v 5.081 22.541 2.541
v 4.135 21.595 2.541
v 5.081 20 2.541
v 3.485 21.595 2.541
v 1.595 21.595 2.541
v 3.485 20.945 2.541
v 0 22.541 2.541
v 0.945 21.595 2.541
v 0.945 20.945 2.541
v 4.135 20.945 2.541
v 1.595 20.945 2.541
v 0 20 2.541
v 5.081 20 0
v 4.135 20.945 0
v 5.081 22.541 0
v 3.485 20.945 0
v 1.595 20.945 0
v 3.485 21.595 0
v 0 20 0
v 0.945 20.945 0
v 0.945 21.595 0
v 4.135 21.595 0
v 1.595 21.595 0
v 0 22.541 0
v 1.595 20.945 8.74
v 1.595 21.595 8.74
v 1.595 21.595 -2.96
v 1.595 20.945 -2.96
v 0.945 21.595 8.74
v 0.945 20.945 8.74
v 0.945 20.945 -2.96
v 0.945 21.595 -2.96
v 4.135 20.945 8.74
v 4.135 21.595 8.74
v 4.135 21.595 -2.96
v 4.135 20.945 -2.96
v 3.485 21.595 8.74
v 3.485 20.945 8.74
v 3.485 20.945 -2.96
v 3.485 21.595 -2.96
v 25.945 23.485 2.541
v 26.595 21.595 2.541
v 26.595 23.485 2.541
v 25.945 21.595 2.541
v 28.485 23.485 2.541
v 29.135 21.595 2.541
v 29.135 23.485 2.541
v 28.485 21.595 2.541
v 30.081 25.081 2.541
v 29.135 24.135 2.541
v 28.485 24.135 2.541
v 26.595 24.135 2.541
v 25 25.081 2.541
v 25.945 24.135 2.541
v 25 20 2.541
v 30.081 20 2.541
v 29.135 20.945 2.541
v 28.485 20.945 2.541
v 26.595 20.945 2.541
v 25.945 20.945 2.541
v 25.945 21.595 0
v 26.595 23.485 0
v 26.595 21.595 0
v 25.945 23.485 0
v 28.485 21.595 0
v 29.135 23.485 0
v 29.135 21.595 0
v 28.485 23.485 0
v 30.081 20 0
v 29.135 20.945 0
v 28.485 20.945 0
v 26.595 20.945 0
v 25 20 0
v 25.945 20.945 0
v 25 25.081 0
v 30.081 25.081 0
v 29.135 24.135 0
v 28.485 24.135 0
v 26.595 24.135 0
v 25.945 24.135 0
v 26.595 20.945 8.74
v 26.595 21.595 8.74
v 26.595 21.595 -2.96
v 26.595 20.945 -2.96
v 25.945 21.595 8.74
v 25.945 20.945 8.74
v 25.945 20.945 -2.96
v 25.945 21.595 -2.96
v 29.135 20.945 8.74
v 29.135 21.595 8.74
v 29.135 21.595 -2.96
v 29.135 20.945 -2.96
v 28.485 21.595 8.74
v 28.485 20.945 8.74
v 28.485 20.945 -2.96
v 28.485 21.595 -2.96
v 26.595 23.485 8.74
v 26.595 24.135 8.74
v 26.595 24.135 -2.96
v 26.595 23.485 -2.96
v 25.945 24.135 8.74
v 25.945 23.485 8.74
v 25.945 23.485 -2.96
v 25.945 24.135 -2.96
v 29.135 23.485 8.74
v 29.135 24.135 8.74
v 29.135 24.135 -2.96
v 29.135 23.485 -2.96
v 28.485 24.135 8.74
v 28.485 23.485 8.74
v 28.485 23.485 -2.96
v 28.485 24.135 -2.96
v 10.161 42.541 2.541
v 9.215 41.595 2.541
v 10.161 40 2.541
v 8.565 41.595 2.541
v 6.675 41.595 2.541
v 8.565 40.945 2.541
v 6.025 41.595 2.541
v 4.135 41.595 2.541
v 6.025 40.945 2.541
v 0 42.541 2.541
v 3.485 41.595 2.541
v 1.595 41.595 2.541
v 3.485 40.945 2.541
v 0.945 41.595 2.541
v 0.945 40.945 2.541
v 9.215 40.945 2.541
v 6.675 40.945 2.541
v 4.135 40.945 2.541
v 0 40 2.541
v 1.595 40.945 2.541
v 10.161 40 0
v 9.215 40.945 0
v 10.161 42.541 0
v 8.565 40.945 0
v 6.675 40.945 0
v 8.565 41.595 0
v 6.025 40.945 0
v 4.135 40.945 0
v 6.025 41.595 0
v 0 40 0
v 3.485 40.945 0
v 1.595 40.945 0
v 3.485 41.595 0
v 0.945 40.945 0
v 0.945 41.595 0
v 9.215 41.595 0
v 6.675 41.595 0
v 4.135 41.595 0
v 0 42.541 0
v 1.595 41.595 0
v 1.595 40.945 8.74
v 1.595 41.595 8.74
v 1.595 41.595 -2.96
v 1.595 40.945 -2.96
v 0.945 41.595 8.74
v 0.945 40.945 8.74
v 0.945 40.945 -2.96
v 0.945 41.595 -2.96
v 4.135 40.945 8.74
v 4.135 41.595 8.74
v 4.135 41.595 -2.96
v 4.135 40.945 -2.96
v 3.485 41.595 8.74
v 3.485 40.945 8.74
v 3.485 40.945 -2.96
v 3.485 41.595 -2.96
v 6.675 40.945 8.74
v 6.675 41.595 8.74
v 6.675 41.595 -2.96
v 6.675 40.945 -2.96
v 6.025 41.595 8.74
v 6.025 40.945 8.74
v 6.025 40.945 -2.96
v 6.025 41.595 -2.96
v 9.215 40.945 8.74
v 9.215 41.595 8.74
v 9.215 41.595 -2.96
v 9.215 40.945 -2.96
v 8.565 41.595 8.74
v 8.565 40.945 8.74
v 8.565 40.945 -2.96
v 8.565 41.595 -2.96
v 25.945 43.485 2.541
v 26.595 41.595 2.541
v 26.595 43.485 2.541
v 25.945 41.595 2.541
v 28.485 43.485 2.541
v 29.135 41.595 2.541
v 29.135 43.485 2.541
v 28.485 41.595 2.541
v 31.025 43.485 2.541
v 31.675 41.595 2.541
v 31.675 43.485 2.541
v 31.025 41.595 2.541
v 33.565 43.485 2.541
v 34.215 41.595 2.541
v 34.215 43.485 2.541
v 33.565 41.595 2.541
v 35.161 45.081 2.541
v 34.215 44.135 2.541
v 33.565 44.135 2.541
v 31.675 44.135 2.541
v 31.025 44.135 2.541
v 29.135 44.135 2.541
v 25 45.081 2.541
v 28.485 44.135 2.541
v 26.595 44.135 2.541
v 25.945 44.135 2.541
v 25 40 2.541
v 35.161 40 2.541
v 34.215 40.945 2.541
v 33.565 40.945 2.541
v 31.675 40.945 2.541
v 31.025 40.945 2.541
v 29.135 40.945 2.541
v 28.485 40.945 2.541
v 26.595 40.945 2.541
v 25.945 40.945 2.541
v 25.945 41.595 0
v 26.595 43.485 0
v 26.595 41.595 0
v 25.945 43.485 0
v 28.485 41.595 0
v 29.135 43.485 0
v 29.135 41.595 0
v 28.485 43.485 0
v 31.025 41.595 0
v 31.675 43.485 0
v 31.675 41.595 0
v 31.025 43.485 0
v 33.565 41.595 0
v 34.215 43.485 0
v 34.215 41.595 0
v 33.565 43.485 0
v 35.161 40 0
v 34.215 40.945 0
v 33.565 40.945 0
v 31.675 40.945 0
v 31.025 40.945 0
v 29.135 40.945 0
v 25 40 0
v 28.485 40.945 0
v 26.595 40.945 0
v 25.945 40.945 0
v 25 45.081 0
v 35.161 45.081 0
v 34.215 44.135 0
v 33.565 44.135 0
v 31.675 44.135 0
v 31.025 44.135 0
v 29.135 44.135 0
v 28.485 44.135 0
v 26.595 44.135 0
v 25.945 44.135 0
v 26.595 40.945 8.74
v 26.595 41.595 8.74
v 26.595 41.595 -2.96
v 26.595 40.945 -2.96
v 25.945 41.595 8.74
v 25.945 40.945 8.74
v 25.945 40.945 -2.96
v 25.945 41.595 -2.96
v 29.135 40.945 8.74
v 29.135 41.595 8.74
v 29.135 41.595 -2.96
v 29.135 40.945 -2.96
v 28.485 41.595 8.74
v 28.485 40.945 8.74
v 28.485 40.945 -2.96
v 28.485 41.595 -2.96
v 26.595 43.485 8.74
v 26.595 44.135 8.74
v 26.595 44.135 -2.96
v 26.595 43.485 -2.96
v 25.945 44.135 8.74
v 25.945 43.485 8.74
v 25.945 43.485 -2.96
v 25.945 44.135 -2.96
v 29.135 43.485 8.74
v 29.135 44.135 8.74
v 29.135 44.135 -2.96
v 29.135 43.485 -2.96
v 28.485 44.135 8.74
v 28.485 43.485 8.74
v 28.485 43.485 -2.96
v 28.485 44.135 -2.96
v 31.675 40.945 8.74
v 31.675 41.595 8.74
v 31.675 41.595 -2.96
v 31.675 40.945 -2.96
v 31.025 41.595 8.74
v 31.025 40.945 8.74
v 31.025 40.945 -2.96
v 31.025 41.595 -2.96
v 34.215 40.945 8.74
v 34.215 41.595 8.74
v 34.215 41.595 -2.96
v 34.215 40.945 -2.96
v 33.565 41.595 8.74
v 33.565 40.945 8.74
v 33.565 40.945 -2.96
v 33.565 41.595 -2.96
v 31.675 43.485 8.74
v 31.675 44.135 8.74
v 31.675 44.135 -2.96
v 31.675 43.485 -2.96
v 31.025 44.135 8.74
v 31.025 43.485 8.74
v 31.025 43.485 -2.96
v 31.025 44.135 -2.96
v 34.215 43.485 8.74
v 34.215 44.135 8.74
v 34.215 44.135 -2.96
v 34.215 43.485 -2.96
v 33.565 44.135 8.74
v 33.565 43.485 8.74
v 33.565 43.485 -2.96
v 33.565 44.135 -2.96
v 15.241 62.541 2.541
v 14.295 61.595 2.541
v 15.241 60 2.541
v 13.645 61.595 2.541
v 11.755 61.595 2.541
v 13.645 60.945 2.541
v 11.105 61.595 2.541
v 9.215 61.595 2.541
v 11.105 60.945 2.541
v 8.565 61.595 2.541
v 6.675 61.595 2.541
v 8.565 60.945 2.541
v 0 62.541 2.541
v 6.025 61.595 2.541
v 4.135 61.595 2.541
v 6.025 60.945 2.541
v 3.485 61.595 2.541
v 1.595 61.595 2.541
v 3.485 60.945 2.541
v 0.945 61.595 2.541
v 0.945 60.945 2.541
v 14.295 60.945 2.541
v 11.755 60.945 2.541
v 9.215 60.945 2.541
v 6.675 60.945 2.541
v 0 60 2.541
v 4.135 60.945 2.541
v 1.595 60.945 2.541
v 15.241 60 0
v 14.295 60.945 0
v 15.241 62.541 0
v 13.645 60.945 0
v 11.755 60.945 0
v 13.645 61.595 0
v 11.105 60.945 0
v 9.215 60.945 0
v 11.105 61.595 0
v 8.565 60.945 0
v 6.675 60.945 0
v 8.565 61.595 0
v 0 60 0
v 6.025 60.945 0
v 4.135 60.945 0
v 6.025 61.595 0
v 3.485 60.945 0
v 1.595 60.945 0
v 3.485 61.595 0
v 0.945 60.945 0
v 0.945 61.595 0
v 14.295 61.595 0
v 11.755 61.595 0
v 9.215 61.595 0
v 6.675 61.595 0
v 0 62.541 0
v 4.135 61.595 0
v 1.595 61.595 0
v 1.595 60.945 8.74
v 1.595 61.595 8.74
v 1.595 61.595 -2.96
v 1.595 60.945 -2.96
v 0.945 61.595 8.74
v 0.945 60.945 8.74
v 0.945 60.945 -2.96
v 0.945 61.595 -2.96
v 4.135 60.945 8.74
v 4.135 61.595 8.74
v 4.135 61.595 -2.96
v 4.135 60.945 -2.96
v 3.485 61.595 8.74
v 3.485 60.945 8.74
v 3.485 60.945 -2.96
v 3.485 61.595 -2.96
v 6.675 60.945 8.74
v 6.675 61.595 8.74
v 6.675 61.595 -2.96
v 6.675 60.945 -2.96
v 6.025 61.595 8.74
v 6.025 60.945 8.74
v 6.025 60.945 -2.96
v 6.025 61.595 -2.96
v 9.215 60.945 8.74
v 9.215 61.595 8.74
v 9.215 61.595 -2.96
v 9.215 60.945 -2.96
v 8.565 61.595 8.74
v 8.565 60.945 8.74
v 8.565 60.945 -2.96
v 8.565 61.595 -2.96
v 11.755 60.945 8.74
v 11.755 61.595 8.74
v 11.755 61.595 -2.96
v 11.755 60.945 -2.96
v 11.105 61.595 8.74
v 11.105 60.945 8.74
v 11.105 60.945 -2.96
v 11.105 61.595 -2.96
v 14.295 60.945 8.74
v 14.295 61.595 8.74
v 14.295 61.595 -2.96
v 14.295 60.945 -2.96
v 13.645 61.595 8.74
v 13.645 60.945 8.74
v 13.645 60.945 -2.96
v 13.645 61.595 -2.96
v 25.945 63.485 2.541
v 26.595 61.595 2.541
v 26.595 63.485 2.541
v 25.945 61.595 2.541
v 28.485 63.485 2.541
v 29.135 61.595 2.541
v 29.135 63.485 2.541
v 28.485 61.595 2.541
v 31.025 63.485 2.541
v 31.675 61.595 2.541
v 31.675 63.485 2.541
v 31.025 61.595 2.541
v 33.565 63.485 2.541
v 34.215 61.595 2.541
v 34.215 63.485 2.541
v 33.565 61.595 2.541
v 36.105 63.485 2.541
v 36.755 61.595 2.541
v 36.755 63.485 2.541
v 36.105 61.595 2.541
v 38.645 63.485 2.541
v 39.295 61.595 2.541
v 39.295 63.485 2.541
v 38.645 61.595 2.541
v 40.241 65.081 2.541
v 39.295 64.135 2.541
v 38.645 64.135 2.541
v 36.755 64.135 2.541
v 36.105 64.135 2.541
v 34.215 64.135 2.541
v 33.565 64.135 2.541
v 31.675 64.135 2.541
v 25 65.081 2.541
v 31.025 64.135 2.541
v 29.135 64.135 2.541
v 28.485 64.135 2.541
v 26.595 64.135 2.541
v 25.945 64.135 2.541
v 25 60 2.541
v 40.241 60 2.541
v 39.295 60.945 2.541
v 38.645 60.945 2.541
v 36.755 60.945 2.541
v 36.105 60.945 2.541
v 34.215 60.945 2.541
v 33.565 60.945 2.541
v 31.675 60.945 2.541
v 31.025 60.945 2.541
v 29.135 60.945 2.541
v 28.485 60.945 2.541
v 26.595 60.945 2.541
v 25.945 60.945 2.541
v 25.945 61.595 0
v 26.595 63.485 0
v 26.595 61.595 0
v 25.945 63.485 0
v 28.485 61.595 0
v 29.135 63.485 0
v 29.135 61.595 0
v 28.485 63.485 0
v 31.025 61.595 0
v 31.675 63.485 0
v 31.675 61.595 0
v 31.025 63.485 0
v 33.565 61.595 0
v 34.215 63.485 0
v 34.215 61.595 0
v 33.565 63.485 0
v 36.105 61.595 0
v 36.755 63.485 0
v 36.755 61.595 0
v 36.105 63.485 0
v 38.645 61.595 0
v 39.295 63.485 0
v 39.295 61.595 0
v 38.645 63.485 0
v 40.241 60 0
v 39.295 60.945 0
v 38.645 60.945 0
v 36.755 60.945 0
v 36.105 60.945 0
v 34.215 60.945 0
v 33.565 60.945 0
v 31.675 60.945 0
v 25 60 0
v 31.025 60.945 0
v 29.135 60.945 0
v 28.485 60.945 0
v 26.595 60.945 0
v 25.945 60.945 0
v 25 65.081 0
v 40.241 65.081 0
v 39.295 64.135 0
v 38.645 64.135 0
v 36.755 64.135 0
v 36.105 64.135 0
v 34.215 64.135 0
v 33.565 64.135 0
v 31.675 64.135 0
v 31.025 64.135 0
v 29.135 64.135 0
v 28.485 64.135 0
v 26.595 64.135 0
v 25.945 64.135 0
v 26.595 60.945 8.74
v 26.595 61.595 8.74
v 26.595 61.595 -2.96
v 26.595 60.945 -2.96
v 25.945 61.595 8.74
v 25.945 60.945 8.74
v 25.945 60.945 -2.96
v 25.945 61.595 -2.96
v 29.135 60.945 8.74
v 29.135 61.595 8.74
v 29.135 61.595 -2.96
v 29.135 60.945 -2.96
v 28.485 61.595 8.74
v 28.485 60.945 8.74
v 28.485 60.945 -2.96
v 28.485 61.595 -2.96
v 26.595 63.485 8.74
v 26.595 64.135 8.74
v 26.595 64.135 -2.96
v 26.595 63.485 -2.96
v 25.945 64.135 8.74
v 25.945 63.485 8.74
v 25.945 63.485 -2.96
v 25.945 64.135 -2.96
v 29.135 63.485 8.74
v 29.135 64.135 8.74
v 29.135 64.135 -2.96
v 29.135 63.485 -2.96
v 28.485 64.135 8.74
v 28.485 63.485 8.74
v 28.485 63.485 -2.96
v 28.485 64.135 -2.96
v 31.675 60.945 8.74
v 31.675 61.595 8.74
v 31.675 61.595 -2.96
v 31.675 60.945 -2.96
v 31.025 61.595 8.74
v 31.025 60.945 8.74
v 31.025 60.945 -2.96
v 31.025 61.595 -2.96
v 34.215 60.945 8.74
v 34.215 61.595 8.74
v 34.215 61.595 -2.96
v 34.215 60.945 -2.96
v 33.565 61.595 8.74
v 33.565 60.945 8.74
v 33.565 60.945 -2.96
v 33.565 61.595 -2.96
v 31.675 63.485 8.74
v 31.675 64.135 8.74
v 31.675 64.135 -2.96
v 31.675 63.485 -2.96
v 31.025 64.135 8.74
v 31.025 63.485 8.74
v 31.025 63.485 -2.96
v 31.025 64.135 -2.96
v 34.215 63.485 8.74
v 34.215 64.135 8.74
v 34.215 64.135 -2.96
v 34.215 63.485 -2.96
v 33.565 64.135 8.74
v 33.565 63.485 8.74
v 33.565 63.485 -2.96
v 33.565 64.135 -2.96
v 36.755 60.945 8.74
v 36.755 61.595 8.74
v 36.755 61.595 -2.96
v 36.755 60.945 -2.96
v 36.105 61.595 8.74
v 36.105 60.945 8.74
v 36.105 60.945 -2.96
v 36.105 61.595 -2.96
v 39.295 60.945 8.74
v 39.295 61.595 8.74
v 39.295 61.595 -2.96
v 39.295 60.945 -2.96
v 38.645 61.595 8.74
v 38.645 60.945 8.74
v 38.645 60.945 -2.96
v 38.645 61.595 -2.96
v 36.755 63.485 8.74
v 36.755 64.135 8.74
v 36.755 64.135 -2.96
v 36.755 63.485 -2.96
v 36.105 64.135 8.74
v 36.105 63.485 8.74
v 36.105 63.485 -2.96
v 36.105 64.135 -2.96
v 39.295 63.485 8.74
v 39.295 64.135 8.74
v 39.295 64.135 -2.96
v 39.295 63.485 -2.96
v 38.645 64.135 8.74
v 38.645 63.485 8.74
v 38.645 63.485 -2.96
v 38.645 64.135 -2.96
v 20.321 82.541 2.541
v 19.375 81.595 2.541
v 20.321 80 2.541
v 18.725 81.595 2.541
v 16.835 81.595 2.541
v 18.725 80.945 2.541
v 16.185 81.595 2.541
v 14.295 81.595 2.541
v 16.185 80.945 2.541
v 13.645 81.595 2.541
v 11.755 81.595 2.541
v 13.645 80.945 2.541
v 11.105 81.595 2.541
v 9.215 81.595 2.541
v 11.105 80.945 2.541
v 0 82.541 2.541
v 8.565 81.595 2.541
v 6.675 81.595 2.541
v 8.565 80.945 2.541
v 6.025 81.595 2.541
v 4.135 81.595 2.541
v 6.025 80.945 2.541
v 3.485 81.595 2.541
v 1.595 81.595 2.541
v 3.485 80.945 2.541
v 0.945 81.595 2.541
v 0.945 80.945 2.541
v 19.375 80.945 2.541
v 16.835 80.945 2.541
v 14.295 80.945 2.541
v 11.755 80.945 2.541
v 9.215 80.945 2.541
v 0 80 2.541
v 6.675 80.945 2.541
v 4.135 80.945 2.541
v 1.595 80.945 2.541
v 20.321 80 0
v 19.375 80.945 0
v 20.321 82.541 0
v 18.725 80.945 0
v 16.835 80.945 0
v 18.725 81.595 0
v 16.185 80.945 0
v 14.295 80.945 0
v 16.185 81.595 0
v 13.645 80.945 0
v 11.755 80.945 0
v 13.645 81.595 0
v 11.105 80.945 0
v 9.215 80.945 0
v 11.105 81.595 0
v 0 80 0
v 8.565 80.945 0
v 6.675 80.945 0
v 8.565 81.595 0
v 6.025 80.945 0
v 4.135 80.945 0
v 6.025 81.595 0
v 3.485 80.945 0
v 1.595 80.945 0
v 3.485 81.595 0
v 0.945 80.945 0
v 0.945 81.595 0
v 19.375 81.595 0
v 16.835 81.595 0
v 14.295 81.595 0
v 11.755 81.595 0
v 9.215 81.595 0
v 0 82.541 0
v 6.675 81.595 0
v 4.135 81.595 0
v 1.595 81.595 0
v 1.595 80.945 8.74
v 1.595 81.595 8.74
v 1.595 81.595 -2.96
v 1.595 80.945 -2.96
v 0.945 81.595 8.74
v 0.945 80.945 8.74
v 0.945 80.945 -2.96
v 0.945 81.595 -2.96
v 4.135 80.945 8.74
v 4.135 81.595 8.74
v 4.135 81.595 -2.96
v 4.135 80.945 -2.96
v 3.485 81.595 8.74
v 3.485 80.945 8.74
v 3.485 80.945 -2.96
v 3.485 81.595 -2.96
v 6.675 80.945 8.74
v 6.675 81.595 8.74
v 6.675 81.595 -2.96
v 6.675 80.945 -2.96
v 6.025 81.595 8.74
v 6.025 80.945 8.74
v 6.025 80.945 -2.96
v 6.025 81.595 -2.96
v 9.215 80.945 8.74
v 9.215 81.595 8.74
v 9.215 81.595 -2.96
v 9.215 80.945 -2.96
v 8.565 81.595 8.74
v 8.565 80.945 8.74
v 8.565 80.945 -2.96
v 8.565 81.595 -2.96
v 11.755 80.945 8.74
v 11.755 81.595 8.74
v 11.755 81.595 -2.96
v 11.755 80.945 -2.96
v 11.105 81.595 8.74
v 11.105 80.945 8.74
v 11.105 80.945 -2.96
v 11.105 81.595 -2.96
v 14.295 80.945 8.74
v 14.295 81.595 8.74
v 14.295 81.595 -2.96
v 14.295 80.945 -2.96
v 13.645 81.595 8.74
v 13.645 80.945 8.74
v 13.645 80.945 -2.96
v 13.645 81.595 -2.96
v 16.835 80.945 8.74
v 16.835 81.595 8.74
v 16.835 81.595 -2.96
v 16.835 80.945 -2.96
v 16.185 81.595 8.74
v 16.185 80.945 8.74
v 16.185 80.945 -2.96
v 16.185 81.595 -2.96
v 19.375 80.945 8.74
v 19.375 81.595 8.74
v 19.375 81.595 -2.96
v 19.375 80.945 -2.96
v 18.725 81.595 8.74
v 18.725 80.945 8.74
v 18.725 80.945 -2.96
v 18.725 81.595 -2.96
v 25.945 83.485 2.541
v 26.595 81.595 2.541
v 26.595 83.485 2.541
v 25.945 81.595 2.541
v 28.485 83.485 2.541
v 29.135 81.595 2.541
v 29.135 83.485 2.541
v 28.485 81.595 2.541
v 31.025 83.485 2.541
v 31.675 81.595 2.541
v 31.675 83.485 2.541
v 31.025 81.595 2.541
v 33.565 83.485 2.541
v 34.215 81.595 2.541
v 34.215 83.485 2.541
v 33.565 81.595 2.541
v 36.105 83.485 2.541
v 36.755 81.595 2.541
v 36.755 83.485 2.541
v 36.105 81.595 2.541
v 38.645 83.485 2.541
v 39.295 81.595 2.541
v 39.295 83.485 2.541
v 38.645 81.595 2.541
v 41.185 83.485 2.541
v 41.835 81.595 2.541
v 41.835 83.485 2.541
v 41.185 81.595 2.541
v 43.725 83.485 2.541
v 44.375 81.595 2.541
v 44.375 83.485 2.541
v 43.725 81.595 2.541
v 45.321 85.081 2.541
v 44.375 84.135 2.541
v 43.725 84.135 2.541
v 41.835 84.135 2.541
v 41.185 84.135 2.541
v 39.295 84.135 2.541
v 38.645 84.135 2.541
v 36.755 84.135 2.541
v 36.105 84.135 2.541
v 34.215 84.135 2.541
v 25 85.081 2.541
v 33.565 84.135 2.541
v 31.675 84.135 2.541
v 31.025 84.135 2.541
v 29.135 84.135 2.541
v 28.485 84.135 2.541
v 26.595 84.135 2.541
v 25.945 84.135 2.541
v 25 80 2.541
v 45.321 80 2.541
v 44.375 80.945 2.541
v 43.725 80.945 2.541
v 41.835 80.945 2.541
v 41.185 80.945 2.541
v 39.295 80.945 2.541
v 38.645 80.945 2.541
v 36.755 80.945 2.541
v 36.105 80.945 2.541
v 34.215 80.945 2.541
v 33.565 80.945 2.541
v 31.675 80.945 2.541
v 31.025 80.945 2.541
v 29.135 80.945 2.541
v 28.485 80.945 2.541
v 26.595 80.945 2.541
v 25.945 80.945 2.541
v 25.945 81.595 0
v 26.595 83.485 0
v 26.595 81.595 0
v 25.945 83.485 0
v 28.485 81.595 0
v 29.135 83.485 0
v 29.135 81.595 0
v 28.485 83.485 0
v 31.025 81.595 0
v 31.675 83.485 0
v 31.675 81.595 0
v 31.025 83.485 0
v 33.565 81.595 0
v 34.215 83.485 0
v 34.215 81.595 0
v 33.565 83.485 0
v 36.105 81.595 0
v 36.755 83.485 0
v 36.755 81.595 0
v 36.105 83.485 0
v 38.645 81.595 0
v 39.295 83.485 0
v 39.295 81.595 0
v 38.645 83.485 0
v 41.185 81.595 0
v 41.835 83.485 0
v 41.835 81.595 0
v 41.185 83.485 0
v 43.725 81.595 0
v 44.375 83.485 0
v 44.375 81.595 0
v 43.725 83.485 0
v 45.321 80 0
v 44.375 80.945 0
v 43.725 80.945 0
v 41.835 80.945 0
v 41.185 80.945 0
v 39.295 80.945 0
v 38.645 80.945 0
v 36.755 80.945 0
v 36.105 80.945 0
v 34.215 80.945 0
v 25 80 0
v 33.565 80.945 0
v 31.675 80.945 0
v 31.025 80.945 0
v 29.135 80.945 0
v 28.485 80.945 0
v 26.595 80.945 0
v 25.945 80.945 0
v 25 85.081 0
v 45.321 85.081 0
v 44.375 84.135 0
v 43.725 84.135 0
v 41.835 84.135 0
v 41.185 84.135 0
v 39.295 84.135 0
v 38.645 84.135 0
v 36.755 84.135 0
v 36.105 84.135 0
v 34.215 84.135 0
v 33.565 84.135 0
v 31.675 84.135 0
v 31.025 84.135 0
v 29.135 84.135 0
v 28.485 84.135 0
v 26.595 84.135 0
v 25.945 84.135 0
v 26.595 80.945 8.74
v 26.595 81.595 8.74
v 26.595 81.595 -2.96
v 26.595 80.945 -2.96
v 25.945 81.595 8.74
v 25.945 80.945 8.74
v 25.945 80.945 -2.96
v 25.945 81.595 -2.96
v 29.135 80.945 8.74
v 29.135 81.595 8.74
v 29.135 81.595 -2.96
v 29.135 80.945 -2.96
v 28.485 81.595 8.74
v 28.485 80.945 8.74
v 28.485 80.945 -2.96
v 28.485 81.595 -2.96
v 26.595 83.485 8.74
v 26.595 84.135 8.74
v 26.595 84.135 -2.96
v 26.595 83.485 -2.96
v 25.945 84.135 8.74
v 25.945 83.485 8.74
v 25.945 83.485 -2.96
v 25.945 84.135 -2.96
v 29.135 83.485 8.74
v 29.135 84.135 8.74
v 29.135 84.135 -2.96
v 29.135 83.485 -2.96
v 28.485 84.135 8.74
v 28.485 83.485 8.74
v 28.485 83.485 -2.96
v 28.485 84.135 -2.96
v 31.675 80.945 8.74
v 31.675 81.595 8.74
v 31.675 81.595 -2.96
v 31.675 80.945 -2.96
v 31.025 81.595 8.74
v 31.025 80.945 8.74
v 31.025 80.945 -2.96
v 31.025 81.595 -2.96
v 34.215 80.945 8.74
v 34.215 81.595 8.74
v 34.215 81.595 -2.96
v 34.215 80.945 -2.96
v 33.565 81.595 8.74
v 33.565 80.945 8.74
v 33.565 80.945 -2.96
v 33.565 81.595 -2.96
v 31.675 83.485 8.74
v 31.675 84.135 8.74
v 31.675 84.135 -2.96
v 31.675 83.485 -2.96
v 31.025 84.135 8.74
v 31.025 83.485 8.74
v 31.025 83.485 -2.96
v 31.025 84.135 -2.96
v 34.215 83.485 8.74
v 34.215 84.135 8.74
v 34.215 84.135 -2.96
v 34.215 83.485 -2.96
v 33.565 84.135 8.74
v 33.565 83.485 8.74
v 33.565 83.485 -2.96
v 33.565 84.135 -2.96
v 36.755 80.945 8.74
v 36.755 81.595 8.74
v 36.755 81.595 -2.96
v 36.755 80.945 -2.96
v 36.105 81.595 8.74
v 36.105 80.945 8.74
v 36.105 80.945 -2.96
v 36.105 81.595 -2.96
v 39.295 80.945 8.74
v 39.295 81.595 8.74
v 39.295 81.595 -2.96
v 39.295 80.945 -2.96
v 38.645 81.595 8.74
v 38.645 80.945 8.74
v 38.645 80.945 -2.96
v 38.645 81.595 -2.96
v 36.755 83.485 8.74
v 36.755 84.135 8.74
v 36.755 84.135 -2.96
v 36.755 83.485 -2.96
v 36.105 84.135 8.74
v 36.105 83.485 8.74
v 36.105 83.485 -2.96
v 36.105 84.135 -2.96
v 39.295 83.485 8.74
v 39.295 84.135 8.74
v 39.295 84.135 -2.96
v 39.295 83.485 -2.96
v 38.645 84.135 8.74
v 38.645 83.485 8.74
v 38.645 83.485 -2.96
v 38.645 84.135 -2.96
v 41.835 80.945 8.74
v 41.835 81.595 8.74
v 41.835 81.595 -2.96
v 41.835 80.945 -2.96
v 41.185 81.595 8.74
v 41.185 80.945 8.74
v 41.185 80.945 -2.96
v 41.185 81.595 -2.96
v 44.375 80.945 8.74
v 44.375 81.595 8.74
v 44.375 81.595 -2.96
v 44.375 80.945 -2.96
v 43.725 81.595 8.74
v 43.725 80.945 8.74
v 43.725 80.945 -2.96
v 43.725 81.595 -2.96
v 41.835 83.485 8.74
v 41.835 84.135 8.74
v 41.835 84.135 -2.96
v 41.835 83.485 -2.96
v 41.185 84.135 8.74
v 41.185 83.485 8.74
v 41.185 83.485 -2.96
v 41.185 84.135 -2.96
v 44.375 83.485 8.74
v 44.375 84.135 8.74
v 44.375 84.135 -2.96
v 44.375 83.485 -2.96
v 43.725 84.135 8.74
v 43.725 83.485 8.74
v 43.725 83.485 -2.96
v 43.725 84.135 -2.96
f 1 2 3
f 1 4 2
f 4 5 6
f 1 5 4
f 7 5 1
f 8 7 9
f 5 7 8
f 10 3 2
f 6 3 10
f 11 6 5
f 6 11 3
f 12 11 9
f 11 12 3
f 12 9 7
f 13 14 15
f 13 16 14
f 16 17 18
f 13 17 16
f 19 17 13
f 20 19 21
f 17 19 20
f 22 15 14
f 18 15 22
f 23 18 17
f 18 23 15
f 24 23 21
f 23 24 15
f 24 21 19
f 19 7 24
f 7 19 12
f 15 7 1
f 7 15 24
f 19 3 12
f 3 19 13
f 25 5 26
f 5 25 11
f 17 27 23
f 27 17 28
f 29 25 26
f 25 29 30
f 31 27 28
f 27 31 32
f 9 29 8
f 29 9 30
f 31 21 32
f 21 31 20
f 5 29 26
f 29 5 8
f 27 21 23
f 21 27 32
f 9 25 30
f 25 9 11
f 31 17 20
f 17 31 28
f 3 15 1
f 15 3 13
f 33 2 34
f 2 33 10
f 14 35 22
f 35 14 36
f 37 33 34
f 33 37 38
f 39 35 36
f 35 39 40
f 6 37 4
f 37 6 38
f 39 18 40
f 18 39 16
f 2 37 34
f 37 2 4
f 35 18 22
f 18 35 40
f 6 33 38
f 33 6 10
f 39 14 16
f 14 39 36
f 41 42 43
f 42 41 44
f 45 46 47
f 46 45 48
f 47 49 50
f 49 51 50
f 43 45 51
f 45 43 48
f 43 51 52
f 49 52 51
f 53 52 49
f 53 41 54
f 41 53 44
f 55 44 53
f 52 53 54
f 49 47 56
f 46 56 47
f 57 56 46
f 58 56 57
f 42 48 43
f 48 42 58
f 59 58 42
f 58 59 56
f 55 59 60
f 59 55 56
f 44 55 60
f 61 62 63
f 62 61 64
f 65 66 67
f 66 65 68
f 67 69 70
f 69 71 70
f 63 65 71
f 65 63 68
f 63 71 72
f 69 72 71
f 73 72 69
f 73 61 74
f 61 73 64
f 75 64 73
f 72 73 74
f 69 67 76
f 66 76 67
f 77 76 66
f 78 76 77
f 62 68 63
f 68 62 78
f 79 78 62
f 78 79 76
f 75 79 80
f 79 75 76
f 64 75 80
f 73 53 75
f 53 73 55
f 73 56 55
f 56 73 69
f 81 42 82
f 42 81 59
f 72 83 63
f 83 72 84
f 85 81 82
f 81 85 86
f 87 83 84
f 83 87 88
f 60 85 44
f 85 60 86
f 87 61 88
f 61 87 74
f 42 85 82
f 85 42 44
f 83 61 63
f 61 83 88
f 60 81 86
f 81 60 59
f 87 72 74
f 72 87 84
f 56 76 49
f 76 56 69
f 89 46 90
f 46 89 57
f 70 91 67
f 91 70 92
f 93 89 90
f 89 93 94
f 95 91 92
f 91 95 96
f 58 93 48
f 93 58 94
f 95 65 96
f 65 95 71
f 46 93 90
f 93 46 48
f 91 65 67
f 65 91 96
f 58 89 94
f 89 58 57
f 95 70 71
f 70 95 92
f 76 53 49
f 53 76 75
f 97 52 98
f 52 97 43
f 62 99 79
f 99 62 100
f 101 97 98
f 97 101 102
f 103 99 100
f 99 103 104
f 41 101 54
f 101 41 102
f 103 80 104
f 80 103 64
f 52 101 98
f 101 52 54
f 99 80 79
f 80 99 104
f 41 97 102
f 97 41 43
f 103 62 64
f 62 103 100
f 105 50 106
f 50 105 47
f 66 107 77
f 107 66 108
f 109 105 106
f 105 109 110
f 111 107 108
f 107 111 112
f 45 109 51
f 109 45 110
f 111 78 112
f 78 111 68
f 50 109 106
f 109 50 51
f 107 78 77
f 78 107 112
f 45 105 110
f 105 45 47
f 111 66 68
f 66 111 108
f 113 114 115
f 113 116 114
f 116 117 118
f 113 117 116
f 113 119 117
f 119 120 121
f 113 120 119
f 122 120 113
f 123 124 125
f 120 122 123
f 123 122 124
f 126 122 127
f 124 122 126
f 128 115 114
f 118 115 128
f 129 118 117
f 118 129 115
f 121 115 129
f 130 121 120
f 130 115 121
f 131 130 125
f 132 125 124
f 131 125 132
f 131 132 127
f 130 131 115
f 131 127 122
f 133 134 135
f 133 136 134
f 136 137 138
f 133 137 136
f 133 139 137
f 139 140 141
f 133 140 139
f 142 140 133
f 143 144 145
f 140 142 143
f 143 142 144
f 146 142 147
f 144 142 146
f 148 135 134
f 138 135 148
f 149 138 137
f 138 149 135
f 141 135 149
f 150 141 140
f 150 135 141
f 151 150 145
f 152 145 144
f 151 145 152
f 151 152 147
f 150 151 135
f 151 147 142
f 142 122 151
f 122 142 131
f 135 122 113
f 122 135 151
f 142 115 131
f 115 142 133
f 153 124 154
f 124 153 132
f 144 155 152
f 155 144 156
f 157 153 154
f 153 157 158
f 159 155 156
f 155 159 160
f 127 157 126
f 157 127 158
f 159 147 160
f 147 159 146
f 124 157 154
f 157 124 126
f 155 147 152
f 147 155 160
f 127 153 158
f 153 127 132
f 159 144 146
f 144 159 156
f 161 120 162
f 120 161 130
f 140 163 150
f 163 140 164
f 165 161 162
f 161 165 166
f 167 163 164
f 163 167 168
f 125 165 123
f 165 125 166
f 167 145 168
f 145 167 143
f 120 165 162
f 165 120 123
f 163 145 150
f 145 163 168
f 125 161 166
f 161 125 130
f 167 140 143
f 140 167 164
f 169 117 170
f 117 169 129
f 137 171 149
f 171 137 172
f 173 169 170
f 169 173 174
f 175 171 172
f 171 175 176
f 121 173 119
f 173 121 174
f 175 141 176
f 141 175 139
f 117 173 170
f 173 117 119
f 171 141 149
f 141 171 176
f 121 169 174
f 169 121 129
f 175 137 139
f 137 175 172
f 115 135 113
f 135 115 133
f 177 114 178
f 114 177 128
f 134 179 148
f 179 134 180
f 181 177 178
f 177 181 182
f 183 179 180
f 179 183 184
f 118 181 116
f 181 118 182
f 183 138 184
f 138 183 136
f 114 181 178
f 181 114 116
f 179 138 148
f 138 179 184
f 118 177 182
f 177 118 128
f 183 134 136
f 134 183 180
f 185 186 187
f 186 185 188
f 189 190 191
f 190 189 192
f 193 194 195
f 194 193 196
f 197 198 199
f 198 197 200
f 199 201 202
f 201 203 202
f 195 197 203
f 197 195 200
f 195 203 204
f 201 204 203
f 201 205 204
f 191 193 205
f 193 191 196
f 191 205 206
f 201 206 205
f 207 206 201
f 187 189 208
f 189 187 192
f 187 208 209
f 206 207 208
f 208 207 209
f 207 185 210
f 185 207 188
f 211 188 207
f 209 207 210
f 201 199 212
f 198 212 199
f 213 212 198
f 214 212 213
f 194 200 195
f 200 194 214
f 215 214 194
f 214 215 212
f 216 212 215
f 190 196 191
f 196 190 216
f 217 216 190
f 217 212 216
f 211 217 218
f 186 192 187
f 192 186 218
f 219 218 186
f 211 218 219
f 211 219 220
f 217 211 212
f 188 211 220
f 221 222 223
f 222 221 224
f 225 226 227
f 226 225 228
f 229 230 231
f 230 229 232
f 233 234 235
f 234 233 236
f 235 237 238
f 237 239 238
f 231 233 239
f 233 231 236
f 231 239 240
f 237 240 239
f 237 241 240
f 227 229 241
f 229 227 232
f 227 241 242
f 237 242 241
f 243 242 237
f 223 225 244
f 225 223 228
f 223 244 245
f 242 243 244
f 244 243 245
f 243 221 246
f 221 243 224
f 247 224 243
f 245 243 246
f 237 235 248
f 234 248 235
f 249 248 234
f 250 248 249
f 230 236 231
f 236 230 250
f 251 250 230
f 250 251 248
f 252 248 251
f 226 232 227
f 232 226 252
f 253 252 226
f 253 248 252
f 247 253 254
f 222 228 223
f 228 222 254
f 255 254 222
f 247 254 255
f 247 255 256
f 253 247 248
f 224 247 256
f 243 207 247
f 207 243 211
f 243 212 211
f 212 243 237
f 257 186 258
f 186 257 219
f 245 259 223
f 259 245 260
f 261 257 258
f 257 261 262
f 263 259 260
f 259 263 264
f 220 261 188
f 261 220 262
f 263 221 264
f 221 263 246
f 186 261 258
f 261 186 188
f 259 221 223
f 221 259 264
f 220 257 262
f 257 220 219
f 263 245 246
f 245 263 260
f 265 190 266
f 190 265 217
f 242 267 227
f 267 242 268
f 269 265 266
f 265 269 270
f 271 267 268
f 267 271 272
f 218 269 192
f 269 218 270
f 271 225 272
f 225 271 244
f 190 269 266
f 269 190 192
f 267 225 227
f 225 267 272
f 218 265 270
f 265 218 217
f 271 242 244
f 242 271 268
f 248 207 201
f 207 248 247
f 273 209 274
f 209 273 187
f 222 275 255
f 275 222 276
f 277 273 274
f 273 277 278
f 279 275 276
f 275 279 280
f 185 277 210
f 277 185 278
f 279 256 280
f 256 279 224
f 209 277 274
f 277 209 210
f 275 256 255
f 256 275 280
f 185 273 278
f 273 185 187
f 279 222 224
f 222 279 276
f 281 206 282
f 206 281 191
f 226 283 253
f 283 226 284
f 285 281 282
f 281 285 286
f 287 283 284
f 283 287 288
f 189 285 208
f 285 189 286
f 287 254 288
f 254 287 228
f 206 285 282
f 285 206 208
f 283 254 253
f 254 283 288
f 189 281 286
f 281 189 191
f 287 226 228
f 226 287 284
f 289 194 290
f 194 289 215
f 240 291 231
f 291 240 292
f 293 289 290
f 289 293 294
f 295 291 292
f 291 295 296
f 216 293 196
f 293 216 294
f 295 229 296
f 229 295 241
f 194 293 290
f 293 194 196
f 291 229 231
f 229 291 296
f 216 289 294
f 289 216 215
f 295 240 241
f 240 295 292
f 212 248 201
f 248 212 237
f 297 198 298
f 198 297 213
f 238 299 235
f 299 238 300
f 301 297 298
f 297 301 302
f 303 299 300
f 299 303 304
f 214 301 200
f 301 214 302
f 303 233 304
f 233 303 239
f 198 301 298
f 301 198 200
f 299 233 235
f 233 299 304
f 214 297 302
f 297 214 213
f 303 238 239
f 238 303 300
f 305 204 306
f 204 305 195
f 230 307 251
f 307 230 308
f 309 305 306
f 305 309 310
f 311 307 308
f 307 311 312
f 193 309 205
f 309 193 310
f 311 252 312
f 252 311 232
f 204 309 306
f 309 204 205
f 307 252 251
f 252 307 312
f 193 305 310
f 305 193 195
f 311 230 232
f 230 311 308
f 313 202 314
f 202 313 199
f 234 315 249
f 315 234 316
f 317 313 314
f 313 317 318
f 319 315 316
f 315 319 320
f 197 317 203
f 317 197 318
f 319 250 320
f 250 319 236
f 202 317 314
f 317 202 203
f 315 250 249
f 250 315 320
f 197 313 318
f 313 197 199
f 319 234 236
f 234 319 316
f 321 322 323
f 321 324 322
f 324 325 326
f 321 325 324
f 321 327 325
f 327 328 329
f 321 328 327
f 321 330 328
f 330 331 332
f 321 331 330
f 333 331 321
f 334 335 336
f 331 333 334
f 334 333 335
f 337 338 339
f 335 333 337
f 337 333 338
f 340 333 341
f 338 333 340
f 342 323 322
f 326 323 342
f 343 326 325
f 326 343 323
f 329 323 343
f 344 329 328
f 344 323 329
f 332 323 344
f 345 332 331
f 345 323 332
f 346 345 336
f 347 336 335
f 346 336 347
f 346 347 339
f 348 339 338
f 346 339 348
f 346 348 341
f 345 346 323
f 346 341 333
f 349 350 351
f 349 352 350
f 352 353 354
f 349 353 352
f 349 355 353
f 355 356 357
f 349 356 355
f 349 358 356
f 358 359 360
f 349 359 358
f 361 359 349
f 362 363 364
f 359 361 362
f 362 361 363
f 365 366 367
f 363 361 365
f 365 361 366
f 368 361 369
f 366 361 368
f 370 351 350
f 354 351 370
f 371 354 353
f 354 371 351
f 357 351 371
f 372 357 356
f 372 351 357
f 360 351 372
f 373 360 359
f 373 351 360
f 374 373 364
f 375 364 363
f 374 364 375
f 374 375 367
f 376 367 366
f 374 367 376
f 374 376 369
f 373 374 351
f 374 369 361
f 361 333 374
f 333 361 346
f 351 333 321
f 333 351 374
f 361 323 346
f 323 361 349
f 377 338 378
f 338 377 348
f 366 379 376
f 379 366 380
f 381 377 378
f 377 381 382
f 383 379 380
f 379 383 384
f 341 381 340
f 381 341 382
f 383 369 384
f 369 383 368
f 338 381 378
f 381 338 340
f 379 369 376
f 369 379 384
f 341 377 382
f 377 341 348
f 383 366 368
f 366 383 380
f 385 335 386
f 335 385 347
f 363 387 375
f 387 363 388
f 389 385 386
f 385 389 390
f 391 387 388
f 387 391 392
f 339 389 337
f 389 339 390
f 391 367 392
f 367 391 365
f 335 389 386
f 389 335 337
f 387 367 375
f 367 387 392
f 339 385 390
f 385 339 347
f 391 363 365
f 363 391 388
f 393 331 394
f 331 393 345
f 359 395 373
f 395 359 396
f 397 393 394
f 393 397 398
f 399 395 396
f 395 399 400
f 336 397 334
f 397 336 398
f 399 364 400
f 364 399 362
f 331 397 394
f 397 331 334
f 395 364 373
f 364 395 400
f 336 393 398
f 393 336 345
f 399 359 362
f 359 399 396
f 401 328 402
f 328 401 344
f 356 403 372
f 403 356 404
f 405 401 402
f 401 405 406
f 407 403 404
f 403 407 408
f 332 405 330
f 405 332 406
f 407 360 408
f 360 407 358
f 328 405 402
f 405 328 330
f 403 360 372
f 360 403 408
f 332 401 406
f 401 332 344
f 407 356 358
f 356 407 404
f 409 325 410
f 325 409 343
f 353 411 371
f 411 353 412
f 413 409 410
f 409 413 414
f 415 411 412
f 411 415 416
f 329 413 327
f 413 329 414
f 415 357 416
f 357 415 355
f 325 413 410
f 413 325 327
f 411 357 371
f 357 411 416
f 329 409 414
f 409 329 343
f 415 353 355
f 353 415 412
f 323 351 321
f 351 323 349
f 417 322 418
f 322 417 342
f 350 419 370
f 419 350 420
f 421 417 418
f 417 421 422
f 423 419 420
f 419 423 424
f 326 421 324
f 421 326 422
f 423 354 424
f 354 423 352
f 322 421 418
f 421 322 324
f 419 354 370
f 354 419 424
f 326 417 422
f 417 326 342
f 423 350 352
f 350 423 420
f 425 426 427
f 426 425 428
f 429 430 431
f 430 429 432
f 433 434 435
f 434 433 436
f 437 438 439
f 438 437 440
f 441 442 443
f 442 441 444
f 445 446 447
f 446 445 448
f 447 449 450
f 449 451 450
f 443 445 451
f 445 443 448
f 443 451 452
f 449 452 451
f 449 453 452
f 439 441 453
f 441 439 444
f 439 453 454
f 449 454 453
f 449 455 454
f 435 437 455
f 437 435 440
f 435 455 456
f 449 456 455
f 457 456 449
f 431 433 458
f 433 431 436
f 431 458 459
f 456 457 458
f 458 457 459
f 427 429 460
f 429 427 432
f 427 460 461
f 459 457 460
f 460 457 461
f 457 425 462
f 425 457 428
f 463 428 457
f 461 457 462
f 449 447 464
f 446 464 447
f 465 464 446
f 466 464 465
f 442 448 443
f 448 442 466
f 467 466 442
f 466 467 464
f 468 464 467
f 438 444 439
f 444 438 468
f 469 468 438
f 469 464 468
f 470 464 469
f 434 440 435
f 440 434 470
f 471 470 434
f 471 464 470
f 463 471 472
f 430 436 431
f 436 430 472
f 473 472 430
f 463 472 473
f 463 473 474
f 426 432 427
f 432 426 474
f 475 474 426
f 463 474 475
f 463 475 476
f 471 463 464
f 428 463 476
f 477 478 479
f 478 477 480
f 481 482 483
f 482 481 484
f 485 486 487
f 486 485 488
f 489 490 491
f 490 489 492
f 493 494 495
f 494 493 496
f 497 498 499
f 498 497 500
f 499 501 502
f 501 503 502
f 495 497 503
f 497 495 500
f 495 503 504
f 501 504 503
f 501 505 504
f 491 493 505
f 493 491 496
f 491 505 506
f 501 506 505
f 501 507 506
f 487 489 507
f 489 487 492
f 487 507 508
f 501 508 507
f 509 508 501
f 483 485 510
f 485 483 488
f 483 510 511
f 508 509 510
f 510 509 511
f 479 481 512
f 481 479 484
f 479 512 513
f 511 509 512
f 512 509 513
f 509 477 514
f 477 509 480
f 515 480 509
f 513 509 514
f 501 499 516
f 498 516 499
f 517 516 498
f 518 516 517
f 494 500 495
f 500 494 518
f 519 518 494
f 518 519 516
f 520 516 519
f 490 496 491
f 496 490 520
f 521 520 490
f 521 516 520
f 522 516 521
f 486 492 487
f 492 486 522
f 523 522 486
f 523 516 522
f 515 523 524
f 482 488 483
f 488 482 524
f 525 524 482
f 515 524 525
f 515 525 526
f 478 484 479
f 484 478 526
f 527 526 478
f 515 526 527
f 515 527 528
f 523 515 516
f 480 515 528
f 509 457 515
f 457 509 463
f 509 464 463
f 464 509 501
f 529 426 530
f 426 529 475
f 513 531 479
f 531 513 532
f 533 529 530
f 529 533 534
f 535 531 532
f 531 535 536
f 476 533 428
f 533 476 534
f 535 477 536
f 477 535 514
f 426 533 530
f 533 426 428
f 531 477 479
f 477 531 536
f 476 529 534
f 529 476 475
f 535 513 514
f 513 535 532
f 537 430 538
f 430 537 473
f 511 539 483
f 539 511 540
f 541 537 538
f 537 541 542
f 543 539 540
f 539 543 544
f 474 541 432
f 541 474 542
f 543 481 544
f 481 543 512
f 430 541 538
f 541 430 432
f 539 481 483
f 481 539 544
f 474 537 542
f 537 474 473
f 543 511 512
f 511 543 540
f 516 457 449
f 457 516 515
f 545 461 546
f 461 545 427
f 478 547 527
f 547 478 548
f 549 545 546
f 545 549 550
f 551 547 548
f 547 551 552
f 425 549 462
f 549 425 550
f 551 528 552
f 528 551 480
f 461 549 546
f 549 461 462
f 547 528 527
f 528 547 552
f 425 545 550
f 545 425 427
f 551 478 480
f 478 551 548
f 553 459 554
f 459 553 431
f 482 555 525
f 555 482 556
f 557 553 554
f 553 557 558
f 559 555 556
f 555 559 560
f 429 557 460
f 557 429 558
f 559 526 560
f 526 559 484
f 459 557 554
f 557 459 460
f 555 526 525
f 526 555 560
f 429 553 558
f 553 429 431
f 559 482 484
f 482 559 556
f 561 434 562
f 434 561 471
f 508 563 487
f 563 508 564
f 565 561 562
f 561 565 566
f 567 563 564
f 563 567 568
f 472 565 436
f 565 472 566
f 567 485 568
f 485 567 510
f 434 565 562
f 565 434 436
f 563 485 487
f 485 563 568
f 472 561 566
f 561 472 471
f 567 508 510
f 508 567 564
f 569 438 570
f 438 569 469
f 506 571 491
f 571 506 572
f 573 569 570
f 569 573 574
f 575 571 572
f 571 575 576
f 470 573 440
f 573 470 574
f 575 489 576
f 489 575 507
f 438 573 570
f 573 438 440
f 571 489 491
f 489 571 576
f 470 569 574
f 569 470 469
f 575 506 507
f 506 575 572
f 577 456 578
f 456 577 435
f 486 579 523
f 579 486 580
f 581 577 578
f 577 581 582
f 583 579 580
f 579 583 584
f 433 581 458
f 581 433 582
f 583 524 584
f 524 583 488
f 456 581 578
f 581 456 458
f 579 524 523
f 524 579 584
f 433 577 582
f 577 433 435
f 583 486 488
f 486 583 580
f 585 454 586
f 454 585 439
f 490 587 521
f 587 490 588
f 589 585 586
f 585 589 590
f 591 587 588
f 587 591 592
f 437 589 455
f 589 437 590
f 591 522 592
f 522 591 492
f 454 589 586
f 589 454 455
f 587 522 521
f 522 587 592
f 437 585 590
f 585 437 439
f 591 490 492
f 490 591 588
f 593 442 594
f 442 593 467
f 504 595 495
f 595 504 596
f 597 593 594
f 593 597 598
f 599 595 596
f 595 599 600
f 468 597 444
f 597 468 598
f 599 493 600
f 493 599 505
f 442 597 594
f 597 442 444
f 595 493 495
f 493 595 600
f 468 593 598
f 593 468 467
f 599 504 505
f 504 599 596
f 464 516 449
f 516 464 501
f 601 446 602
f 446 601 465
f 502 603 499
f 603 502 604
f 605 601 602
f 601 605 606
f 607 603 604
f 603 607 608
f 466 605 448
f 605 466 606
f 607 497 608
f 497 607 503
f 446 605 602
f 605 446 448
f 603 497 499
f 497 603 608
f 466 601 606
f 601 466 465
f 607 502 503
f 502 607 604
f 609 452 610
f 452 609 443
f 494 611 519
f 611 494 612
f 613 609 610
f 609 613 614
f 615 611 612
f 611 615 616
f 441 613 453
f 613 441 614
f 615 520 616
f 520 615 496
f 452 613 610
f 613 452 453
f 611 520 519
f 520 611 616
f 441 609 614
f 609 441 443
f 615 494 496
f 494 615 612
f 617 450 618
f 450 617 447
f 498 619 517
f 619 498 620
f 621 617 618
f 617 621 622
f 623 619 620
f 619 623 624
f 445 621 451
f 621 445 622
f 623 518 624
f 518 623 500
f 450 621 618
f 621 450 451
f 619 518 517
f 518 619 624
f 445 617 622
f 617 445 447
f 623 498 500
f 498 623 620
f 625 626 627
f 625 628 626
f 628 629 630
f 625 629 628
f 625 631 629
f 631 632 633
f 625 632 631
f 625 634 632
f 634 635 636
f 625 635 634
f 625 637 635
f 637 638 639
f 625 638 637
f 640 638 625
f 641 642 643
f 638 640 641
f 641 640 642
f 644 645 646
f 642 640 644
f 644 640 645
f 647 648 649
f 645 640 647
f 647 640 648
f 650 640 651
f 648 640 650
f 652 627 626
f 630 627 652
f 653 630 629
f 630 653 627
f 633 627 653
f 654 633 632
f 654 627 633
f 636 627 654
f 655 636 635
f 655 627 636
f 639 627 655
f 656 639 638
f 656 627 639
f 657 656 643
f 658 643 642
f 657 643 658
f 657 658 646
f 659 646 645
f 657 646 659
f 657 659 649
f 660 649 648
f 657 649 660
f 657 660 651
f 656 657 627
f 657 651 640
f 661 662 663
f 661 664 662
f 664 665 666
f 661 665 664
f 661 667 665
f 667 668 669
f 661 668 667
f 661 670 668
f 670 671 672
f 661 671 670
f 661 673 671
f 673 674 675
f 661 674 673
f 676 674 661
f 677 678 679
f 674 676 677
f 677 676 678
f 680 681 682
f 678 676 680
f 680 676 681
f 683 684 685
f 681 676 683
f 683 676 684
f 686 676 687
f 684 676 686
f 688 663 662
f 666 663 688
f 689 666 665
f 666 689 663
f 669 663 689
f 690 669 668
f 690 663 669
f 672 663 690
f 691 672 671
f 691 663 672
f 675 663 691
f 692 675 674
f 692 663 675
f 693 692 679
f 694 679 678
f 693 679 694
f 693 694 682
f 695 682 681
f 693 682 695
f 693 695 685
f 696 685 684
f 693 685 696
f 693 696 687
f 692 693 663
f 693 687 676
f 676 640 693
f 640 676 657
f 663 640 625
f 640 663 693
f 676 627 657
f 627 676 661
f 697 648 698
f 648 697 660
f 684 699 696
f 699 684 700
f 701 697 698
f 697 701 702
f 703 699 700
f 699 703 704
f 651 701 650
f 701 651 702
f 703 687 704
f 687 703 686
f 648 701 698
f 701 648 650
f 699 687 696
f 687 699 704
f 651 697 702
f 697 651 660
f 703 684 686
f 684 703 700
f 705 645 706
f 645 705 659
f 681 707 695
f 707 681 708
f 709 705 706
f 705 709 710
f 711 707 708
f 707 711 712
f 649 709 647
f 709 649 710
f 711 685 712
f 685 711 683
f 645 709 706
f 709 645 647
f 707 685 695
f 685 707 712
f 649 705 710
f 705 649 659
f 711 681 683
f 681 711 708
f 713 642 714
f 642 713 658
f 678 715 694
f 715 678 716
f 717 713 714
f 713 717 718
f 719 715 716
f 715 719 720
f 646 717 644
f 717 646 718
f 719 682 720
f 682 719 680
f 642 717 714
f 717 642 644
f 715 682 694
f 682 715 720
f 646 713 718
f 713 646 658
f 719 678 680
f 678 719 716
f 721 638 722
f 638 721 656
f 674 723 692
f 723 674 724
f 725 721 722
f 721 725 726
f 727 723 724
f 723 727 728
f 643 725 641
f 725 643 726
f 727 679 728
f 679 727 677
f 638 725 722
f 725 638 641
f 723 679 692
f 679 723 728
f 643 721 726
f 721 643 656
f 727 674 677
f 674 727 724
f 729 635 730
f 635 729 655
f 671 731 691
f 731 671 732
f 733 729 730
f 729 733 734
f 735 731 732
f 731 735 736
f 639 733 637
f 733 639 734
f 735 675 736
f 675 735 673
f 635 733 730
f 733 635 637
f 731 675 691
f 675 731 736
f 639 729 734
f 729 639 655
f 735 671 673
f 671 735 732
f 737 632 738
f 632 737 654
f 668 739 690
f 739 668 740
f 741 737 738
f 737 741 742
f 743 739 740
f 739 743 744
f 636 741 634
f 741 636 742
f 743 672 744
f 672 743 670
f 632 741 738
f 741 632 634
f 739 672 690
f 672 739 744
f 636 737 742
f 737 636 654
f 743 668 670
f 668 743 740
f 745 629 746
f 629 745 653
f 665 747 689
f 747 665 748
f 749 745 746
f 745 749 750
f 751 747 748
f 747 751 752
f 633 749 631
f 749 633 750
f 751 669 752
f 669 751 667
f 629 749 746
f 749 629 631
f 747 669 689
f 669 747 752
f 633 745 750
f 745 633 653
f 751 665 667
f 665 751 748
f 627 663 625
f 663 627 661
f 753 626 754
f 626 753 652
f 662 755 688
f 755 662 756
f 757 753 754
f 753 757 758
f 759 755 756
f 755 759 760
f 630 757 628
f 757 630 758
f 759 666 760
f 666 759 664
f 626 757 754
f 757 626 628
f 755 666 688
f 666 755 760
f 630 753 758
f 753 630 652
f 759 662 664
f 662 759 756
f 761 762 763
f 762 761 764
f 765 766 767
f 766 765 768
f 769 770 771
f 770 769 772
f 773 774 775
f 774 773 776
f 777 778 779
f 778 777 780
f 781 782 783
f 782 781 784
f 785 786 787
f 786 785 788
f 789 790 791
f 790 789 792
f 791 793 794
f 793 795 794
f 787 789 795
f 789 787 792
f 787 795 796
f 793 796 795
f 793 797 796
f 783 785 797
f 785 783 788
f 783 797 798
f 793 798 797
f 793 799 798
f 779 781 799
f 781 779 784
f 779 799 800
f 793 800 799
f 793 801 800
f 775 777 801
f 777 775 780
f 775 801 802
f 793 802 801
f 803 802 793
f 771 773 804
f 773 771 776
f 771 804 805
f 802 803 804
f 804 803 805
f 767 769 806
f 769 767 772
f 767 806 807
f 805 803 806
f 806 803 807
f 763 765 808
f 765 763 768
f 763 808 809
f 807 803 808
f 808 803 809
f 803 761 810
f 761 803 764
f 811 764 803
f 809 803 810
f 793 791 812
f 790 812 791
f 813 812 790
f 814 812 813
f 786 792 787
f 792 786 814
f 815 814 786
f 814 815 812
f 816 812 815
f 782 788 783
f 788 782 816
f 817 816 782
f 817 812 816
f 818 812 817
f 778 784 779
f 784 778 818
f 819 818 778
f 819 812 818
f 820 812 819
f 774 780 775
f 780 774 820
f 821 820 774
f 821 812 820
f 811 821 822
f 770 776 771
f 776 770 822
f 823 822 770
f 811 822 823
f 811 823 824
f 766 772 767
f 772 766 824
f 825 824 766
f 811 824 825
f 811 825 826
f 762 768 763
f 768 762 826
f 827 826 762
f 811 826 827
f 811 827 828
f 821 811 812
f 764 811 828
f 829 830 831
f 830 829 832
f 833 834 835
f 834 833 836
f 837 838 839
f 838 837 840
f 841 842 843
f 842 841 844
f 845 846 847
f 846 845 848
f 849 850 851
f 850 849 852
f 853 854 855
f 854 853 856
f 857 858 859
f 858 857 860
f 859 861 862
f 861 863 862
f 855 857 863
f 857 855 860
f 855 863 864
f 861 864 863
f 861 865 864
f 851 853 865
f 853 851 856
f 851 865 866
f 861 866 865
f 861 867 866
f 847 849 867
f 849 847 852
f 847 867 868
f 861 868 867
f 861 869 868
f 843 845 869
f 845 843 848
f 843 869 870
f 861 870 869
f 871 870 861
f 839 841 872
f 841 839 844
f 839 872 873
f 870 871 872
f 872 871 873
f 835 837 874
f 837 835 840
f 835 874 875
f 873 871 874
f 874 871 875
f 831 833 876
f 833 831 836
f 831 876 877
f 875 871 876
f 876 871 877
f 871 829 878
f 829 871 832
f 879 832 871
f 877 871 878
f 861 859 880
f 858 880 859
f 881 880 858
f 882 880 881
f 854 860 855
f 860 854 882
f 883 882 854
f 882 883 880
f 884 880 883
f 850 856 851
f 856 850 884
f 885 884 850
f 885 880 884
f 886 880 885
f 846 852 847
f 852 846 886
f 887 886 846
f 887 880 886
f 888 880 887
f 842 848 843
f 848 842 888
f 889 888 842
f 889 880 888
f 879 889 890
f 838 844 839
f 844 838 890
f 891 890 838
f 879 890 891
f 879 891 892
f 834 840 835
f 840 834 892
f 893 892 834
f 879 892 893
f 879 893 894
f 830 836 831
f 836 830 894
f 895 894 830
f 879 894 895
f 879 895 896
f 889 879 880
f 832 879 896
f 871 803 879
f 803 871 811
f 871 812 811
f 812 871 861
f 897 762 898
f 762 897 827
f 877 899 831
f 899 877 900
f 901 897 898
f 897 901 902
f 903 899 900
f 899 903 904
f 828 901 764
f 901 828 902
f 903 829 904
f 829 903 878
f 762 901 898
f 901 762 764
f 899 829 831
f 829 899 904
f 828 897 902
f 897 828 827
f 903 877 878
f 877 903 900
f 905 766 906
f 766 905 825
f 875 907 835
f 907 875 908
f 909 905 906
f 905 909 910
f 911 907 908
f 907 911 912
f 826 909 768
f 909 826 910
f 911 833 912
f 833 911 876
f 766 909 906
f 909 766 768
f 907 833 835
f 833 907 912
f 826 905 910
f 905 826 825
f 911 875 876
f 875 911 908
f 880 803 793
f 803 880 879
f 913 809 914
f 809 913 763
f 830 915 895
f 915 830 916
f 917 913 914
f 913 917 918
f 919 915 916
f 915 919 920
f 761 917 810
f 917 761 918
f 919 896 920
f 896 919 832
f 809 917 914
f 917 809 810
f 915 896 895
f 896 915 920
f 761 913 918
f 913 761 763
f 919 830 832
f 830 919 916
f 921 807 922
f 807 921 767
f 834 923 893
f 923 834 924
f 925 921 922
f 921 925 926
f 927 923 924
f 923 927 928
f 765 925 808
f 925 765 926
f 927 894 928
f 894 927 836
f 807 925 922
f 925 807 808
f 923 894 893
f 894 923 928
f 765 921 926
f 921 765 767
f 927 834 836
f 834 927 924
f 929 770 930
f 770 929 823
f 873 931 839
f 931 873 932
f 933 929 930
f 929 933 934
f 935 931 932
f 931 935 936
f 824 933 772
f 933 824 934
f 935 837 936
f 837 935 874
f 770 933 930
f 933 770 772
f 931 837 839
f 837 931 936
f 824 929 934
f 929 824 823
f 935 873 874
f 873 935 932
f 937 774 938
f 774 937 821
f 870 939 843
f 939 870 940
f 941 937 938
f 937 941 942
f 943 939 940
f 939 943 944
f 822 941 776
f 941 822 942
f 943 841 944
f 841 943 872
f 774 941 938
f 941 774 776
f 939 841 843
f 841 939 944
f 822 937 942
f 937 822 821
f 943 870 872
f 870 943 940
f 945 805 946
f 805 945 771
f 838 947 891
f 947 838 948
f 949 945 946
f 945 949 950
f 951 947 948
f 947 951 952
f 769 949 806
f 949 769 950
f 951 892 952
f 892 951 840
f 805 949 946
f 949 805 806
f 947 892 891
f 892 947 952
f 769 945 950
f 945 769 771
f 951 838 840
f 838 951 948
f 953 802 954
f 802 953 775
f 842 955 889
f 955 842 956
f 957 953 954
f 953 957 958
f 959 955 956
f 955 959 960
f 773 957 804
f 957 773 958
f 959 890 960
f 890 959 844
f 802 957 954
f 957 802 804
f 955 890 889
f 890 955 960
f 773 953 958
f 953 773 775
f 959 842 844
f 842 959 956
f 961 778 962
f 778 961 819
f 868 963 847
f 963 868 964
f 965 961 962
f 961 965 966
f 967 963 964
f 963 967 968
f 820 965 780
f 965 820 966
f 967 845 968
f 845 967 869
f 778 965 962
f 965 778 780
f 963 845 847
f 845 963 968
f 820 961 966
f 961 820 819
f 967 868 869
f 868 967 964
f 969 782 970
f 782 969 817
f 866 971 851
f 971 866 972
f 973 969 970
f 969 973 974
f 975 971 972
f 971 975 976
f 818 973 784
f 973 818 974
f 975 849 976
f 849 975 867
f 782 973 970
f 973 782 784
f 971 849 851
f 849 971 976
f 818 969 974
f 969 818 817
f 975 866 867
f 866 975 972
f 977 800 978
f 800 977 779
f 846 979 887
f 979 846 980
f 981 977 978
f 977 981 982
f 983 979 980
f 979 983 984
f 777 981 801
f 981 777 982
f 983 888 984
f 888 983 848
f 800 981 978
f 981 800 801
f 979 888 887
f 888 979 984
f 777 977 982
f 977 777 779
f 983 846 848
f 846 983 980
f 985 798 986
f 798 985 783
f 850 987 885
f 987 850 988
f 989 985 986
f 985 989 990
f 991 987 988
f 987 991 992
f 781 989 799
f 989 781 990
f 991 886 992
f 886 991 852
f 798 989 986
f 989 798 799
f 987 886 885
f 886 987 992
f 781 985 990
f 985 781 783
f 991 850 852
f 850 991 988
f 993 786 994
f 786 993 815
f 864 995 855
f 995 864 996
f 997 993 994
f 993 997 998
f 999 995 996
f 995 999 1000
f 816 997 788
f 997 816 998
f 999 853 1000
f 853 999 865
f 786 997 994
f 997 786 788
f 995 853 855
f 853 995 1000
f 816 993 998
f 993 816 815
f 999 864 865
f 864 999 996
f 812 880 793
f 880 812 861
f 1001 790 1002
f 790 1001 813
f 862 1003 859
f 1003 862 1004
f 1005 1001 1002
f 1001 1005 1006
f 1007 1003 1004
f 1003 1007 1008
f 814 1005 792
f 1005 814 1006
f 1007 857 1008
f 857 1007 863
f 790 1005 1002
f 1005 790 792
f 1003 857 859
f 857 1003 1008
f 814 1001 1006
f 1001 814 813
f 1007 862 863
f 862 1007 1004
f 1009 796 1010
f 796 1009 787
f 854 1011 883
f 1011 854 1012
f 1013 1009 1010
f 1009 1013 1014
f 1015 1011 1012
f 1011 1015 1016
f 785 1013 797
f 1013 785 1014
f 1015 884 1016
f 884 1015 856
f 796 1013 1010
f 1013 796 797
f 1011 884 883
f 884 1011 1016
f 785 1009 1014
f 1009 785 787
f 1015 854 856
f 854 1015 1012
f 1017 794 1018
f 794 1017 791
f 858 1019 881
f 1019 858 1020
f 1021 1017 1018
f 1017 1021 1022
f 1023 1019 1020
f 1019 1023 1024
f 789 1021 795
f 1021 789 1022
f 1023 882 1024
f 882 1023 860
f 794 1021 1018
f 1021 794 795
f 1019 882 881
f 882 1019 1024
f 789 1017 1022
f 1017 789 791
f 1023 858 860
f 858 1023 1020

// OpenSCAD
// file: ../modules/pin-header.scad
/* [Hidden] */
_epsilon = 0.001;
_pitch = 2.54;
_pinWidth = 0.65;
_pinHeight = 11.7;
_pinOffsetZ = -2.96;
_pinOffsetXY = (_pitch / 2) - (_pinWidth / 2);

module pin() {
    color("#222")
        cube(_pitch+_epsilon);
    translate([_pinOffsetXY, _pinOffsetXY, _pinOffsetZ])
        color("gainsboro")
            cube([_pinWidth, _pinWidth, _pinHeight]);
}

module pinOffset(row, column) {
    translate([column*_pitch, row*_pitch, 0])
        pin();
}

module pinHeader(rows=1, columns=1) {
    for (row=[0:rows-1], column=[0:columns-1])
        pinOffset(row, column);
}
// main file
use <../modules/pin-header.scad>


//row=[1:2], 
for (column=[1:4], row=[1:2]) {
    translate([row==1 ? 0 : 25, column*20, 0])
        pinHeader(row, column*2);
}
